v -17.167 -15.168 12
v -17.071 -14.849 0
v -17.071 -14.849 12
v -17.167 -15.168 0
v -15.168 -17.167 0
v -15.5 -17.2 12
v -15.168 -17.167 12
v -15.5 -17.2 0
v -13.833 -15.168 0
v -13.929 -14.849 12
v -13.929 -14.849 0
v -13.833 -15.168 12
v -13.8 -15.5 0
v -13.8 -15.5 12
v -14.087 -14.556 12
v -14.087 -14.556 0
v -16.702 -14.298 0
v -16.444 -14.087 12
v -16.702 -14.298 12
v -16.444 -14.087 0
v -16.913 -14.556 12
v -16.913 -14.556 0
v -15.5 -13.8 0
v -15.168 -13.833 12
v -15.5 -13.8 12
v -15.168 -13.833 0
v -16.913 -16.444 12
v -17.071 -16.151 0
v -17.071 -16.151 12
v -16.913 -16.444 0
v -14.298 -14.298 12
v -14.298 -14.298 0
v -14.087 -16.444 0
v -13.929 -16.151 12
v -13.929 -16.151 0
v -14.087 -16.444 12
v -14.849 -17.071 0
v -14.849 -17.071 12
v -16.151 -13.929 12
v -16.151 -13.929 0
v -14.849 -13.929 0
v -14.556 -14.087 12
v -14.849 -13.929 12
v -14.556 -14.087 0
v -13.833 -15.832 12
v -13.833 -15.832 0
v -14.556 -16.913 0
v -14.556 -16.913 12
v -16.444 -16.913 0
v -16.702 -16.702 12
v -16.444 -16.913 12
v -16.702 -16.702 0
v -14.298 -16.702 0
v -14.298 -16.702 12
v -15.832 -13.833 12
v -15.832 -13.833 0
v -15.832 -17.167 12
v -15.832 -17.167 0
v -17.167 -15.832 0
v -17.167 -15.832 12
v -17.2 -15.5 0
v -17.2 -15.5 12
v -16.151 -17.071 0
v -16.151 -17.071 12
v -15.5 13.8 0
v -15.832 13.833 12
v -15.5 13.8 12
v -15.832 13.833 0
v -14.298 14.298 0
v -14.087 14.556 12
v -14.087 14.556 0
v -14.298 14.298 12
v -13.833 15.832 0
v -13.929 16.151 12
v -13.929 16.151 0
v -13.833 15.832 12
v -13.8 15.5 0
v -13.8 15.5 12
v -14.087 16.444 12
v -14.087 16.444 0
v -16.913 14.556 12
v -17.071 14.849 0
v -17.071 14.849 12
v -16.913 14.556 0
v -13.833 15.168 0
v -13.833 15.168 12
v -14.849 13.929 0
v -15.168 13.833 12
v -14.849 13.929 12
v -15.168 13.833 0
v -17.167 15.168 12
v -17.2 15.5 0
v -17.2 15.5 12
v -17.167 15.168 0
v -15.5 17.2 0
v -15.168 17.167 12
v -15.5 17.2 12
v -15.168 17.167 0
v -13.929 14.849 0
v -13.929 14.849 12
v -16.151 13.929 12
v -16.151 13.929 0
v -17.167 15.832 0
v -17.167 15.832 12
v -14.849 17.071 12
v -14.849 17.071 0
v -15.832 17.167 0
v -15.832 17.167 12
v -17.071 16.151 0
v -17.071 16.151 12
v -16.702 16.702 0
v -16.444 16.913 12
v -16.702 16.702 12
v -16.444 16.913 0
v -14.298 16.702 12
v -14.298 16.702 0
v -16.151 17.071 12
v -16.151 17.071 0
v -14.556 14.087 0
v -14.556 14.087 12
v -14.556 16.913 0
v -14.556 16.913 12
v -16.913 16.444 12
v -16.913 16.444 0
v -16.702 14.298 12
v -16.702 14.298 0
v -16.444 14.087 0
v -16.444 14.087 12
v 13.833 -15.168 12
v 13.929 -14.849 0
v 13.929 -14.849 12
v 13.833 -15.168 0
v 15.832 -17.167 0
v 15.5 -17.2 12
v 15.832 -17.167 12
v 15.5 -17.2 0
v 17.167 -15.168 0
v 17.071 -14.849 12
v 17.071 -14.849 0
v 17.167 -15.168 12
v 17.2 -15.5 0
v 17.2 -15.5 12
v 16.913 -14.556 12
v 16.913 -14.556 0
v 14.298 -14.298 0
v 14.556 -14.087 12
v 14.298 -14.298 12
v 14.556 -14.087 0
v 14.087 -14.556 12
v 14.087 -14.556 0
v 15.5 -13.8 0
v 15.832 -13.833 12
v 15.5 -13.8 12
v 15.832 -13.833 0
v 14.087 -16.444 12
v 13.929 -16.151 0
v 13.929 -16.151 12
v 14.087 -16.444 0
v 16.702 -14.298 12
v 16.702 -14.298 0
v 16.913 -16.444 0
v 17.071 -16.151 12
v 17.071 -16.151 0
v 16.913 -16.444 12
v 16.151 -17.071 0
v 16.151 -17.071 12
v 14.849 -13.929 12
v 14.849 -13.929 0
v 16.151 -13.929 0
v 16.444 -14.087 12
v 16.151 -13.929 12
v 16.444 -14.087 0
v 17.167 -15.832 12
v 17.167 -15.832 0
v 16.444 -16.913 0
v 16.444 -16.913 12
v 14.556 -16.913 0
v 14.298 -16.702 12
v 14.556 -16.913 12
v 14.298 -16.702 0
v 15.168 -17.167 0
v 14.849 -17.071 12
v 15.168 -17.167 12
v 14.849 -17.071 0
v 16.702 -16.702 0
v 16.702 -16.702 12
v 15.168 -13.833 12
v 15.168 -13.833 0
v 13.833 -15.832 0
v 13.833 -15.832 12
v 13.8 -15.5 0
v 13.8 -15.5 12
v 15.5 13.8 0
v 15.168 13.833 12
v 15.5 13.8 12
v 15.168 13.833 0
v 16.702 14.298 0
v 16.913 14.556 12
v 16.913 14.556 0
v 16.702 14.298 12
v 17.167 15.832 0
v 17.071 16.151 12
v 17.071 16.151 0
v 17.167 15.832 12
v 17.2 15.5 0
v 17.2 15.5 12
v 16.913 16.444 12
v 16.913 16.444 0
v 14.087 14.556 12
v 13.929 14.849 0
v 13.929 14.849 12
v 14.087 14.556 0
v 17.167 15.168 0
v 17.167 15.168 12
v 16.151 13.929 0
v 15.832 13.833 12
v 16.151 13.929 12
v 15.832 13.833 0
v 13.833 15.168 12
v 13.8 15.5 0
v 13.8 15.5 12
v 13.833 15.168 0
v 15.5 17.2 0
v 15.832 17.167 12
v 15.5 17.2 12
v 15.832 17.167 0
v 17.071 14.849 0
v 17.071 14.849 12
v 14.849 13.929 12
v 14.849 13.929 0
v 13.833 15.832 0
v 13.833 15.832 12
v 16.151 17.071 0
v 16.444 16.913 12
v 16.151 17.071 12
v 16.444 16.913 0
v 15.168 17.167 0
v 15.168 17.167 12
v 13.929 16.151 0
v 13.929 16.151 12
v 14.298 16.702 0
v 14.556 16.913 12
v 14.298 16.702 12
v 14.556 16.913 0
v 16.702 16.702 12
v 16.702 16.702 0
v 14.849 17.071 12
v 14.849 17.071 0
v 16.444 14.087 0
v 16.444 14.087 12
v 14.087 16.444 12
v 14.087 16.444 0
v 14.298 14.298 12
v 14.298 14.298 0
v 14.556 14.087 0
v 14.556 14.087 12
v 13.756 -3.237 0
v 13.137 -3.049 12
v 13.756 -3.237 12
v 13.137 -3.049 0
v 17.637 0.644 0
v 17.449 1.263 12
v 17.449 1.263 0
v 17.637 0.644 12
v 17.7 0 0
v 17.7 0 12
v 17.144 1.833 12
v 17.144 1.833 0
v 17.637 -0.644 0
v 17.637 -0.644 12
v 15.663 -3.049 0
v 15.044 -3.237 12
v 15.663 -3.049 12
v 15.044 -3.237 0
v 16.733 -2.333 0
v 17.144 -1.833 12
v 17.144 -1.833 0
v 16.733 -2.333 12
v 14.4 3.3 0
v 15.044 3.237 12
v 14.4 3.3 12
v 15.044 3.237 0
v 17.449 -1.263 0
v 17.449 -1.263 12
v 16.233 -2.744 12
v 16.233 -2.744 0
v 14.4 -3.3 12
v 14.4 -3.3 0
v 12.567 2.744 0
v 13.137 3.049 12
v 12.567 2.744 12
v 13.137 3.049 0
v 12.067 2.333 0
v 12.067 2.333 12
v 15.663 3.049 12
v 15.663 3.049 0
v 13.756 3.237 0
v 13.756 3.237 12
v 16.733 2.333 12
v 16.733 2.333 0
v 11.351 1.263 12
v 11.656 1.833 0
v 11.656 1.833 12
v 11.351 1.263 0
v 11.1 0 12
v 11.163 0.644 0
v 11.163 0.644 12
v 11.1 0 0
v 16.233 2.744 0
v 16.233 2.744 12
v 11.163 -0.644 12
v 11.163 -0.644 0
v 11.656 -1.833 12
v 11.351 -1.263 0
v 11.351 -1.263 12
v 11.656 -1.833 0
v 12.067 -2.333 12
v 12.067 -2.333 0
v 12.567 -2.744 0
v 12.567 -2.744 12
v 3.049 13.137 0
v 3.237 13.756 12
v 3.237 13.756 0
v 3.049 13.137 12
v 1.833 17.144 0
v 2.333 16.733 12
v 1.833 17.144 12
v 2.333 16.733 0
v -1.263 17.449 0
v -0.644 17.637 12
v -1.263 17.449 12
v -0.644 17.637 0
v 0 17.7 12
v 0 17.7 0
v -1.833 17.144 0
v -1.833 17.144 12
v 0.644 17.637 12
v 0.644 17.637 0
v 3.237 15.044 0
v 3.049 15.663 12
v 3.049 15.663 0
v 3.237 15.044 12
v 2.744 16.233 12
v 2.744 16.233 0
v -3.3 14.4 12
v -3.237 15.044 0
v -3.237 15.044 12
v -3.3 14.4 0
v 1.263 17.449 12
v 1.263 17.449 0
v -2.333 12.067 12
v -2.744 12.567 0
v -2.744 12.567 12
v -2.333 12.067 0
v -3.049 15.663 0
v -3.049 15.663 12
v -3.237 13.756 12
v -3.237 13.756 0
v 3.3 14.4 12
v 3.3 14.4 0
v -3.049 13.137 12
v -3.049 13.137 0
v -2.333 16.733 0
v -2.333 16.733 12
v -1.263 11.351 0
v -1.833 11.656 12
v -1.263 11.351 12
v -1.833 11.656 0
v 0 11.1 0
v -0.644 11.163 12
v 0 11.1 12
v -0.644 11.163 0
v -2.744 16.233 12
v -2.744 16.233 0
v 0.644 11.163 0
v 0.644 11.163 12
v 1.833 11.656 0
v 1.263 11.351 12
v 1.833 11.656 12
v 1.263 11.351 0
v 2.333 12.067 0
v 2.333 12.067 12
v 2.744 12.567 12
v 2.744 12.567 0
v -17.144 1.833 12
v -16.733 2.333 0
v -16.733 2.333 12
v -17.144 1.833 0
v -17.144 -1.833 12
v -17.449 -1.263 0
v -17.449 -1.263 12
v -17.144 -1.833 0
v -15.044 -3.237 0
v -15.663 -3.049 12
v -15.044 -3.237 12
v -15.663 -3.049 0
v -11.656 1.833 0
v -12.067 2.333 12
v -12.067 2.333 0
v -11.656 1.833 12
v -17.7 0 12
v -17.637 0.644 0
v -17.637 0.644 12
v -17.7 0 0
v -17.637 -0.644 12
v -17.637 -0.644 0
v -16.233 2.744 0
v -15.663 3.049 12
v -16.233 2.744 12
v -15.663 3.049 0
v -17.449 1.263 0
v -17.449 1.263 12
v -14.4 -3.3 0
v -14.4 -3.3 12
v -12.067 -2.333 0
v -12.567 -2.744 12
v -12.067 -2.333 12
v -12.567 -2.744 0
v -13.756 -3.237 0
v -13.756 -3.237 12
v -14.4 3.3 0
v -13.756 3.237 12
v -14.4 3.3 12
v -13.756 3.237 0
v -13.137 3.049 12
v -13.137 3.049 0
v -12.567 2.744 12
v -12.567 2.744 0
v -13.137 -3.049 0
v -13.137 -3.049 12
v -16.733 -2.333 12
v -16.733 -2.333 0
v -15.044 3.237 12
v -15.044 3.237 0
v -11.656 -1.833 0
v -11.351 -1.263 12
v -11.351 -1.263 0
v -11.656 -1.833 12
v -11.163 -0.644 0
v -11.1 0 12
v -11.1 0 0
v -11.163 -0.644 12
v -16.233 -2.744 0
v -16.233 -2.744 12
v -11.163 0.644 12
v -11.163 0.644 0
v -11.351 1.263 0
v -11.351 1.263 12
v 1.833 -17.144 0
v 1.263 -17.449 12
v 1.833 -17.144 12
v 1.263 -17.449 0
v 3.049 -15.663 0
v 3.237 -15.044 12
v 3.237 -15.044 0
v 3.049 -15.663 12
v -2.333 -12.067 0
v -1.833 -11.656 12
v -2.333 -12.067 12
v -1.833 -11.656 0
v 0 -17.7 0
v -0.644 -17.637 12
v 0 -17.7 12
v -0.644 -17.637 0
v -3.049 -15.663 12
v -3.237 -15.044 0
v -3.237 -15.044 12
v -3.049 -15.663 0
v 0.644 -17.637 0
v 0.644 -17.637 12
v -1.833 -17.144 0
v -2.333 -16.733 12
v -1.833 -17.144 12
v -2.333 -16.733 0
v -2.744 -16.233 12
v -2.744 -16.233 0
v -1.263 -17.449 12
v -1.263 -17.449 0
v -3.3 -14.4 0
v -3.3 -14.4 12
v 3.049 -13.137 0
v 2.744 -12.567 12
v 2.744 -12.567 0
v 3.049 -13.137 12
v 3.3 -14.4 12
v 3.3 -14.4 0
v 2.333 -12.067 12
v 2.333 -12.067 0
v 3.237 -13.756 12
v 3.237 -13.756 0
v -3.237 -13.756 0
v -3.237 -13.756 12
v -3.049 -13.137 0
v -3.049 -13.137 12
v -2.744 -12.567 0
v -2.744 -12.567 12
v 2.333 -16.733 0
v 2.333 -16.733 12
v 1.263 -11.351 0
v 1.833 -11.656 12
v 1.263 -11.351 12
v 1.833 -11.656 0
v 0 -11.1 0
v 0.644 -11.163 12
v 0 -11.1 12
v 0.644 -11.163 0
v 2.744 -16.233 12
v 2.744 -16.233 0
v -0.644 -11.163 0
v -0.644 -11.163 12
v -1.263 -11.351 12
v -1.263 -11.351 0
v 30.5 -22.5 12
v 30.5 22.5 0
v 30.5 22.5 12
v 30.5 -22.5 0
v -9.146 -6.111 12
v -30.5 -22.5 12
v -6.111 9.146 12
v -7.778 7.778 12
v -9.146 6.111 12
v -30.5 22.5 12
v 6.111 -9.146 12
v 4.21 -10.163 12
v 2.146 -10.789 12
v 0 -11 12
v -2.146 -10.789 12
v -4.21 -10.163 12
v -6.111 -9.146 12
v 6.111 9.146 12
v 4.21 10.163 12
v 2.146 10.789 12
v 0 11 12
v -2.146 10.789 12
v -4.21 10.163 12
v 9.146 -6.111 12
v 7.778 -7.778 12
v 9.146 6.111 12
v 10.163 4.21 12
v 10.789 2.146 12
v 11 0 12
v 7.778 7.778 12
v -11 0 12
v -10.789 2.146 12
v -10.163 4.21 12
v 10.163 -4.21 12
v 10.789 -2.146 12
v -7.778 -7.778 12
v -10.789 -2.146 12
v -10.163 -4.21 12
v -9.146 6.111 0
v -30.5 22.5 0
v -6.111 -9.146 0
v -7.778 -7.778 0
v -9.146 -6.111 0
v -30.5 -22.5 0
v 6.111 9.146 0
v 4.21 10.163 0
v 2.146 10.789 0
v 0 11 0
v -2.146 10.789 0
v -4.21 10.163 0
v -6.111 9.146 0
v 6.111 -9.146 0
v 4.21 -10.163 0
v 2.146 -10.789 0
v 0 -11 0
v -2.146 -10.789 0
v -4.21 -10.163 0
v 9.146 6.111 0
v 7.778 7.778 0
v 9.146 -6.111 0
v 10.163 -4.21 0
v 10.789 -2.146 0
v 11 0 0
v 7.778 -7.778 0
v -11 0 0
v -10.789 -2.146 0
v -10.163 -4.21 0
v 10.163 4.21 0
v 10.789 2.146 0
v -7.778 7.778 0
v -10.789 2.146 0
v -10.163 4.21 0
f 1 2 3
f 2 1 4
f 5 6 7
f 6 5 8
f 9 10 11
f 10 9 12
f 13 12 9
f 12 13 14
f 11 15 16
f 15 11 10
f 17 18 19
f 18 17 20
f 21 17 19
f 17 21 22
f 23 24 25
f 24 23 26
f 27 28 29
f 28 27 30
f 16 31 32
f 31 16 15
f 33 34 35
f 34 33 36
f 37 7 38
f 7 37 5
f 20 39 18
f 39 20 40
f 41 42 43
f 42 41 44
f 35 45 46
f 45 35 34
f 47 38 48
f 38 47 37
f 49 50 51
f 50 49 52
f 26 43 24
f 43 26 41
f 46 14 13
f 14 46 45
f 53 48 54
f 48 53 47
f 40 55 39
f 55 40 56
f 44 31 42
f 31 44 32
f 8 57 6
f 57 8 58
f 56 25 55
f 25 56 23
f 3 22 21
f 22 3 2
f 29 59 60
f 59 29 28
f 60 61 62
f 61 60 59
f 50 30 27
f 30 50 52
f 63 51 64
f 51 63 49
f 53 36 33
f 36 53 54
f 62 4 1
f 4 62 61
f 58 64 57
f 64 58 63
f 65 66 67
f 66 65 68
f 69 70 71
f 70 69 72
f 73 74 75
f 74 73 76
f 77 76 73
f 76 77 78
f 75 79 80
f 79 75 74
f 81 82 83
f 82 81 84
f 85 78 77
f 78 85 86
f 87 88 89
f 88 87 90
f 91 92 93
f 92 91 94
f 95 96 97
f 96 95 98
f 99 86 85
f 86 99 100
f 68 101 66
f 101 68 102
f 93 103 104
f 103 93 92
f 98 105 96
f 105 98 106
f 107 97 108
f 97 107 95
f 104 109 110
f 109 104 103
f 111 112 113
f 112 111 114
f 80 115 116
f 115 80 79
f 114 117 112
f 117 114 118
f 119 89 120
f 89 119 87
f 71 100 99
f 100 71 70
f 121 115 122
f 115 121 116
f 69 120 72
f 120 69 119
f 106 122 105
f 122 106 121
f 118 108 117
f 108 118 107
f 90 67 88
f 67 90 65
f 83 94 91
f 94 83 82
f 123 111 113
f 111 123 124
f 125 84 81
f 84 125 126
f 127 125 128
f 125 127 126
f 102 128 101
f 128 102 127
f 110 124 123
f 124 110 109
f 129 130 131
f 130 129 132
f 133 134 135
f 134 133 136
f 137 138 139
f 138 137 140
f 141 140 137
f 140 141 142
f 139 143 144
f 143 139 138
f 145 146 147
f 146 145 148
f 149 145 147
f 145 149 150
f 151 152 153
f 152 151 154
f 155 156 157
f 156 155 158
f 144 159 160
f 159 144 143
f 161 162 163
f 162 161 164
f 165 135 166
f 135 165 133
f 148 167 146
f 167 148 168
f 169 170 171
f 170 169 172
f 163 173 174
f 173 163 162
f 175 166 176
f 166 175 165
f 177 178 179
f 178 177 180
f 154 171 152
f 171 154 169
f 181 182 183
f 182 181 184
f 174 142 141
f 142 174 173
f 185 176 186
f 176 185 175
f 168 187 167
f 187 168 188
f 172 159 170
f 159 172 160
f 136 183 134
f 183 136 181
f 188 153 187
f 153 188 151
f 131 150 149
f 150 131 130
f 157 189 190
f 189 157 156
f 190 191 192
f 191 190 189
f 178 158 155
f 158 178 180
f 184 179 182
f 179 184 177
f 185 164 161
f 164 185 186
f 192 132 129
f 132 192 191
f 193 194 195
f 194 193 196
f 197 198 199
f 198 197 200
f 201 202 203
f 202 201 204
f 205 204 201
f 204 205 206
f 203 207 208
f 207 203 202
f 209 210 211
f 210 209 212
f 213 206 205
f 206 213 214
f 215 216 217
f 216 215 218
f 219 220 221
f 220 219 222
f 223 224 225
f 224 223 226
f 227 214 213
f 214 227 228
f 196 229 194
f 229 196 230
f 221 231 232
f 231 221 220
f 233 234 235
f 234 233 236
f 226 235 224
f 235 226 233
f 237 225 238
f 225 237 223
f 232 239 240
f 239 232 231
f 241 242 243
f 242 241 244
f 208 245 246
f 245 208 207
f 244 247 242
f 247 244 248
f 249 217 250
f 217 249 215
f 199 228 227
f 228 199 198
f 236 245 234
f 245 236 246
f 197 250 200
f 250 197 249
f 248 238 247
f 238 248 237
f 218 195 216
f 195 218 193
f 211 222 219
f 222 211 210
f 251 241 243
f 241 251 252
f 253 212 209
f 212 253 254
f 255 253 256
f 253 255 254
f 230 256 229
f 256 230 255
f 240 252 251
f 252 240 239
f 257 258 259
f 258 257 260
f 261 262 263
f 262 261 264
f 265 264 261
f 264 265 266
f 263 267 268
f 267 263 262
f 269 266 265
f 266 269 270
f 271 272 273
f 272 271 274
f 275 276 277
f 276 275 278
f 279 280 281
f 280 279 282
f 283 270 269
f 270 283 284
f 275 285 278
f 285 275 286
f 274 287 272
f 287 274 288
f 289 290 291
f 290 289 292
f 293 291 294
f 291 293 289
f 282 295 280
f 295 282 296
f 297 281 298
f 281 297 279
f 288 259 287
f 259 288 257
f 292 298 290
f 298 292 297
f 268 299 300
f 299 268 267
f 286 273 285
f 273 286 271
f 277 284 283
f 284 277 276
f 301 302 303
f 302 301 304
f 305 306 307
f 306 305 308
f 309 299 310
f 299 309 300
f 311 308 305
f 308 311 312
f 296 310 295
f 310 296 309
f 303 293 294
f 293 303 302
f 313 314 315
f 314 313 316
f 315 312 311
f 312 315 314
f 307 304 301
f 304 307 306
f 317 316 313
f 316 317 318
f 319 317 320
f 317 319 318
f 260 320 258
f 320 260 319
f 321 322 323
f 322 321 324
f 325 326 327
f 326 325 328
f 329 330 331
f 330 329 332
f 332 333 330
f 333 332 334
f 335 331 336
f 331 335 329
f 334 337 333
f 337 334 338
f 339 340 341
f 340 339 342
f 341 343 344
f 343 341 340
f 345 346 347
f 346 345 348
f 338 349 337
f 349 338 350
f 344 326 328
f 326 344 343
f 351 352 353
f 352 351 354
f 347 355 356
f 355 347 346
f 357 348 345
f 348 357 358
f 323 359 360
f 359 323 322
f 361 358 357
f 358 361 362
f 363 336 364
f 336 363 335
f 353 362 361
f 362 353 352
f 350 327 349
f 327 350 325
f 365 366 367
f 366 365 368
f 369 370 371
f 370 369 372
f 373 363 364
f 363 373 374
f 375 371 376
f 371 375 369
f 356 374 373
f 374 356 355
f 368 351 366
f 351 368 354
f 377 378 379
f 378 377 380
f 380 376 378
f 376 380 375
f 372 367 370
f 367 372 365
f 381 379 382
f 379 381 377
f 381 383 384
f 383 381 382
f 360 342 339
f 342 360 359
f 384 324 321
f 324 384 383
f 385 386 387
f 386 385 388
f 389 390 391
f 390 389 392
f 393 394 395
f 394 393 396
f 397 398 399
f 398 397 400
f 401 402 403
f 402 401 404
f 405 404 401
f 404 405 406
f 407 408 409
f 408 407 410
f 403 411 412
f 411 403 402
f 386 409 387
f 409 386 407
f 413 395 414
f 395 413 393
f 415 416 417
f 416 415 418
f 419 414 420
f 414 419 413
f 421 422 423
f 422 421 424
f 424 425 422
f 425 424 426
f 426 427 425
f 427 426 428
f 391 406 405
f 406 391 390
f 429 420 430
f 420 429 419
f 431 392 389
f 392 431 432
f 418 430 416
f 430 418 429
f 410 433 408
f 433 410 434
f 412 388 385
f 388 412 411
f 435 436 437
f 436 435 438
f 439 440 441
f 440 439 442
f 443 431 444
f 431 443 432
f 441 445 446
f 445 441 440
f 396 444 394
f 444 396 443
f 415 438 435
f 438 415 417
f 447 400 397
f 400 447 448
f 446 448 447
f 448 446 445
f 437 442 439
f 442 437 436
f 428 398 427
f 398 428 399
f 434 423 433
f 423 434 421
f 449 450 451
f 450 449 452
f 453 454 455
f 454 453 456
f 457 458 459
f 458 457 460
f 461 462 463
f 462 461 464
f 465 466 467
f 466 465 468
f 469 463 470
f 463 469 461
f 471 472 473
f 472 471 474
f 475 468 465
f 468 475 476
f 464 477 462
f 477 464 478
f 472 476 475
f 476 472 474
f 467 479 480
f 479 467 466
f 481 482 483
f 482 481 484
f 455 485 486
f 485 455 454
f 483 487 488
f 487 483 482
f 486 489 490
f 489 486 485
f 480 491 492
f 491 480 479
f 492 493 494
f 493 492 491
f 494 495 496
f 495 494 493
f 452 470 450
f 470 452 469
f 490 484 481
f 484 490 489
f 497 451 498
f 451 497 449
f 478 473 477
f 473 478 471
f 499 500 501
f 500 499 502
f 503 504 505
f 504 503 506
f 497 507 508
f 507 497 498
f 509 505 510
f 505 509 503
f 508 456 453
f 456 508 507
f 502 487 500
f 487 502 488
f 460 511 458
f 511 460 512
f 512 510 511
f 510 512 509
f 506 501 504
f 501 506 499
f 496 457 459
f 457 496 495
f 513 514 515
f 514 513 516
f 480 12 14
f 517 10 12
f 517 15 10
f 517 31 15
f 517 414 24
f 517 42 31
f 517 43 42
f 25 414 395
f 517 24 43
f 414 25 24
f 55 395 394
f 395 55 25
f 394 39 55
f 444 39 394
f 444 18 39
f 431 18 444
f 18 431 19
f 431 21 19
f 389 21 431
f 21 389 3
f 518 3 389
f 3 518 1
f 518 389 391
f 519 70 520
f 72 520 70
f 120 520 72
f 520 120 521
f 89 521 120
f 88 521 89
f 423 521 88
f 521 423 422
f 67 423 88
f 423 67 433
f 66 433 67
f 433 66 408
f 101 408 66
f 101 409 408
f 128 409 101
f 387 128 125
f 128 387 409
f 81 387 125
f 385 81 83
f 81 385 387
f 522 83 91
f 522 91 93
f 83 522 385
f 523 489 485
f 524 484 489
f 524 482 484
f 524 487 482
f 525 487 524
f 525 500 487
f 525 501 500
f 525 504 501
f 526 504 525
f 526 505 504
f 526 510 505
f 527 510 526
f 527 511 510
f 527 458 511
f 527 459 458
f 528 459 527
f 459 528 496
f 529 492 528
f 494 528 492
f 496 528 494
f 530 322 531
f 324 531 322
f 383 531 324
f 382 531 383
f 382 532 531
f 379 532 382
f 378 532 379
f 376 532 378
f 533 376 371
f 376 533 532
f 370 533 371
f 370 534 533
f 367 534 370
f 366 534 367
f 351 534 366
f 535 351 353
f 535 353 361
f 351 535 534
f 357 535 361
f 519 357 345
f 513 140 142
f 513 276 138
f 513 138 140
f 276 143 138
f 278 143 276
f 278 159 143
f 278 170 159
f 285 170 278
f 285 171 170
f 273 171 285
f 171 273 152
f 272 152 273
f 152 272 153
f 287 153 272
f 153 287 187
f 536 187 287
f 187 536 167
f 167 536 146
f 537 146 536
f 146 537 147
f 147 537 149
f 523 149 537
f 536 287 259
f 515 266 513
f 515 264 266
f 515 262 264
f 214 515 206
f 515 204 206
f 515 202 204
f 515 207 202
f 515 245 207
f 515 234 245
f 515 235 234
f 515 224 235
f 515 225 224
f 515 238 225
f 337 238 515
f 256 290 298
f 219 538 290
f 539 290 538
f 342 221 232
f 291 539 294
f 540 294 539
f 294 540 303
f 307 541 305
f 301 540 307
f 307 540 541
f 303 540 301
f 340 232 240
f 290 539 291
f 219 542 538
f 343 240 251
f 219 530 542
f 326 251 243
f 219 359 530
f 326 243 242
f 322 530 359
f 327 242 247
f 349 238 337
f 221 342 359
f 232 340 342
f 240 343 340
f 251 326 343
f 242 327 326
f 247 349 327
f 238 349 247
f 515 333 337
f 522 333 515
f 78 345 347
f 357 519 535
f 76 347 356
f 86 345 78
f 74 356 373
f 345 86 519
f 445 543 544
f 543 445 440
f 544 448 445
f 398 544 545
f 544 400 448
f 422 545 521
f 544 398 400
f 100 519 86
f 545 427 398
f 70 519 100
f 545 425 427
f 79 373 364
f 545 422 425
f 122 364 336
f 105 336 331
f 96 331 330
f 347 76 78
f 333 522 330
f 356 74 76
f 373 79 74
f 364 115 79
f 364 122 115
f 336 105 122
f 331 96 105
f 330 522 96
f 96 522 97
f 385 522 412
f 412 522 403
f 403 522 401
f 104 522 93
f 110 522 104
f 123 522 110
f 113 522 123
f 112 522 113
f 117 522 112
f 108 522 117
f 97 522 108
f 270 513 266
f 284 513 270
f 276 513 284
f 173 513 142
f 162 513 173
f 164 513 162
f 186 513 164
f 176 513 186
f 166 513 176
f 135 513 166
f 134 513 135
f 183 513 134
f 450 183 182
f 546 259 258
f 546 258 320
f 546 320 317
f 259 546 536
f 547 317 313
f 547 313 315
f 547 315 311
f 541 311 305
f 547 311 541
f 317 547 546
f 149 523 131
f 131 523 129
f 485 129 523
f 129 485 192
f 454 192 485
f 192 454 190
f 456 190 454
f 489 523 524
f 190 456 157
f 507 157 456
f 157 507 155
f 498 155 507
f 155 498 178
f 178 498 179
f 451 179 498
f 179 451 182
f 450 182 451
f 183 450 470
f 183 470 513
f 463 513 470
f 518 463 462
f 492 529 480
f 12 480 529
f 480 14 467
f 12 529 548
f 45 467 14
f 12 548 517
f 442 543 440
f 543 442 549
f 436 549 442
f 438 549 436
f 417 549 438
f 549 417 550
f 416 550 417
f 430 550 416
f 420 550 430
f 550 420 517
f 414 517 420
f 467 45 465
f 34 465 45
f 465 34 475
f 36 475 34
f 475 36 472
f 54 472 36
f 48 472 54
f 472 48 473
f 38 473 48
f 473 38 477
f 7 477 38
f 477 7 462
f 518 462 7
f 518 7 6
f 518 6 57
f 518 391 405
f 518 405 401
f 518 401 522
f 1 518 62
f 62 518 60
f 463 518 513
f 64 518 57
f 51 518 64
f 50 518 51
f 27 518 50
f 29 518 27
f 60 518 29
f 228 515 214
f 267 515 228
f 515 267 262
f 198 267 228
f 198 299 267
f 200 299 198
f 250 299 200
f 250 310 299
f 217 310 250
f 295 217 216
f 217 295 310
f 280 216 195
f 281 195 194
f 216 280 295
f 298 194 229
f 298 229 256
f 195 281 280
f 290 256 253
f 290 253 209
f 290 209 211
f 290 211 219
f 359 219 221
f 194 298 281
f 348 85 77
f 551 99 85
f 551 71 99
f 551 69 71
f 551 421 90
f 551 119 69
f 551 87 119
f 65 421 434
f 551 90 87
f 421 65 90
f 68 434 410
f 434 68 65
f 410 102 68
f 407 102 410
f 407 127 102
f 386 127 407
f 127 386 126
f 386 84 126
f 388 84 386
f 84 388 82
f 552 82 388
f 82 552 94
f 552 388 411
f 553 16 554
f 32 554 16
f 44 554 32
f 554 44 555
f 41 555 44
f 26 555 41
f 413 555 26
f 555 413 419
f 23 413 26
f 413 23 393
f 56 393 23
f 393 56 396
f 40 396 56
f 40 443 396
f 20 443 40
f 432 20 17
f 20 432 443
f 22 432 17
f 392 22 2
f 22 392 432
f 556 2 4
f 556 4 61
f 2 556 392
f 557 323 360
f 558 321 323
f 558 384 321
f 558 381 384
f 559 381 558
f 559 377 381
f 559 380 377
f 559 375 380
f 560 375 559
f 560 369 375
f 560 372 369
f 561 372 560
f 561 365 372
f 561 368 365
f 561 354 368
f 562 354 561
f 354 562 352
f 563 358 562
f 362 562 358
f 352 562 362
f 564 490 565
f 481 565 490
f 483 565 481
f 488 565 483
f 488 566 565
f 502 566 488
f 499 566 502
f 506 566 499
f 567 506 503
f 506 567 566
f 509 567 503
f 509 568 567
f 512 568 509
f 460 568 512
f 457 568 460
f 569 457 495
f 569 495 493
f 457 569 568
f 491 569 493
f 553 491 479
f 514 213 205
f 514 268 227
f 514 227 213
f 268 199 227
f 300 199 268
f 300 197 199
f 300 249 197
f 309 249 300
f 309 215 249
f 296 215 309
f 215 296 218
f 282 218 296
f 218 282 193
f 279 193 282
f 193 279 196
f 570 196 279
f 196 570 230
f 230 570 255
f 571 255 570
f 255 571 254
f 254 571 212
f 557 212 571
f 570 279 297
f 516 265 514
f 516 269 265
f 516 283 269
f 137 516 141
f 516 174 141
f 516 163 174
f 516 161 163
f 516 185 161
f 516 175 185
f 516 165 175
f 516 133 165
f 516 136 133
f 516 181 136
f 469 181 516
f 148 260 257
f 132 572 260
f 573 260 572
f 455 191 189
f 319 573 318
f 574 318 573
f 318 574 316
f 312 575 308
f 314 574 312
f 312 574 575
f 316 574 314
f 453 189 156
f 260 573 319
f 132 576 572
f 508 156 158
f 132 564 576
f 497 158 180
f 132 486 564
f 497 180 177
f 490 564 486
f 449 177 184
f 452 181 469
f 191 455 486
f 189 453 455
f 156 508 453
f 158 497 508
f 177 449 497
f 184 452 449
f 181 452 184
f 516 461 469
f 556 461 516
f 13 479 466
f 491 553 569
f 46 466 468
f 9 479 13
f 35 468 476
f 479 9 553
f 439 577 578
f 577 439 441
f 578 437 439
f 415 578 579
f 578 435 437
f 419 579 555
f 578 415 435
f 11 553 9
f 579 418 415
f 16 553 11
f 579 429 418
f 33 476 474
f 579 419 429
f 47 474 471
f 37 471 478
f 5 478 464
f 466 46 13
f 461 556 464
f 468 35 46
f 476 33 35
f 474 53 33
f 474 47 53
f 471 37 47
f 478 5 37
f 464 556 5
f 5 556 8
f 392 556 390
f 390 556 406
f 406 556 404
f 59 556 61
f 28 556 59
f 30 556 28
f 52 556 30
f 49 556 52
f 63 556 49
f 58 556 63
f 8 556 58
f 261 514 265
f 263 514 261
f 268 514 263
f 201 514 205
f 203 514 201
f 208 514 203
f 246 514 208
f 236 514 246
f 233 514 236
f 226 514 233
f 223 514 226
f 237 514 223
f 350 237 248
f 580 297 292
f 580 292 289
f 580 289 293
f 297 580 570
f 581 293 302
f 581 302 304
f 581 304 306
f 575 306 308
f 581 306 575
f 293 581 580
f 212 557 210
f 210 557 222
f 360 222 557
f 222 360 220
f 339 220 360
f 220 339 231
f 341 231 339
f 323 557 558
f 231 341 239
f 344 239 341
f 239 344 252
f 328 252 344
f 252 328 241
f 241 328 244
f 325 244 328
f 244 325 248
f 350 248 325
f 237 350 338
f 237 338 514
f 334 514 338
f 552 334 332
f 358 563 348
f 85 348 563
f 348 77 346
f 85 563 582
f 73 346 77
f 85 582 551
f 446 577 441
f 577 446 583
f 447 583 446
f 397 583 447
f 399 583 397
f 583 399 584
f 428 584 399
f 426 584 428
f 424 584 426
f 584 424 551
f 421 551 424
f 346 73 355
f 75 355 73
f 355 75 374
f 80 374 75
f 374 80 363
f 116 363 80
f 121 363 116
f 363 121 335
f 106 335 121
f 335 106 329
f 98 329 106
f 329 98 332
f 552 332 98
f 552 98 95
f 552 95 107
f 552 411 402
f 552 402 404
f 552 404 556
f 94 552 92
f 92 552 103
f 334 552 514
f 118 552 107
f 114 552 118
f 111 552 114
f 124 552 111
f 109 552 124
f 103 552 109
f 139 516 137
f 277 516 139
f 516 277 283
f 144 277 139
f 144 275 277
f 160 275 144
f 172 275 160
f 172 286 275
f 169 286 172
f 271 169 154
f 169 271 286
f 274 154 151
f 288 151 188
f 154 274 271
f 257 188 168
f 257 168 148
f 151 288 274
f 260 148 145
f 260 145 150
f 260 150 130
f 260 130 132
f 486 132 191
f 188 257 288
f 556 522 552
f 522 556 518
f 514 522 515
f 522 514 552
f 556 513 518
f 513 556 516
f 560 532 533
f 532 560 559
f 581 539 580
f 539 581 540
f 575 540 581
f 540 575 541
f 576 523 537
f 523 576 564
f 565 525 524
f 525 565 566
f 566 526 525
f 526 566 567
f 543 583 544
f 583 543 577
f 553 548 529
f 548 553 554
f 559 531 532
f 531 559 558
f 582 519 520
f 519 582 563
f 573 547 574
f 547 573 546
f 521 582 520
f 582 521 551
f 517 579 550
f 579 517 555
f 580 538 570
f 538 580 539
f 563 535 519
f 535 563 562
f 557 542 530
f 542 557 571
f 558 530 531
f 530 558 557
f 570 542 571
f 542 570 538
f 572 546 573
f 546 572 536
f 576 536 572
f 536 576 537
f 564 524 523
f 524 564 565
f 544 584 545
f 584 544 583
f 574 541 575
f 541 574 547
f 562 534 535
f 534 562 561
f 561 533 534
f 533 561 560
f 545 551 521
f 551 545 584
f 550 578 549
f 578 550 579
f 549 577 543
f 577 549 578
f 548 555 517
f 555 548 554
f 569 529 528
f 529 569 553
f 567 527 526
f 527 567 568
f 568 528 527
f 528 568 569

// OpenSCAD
$fn = 32;

// ----------------------------------------------------------------------
// Motor mount plate: NEMA17, 61 x 45 x 12 mm
// ----------------------------------------------------------------------

// --- parameters (mm) ---
base_x = 61;              // plate length, X
base_y = 45;              // plate width, Y
thick = 12;               // plate thickness
bolt_pitch = 31;          // NEMA17 bolt spacing
motor_d = 3.4;            // NEMA17 screw clearance
boss_hole = 22;           // pilot boss bore
second_d = 6.6;           // second fastener hole
bc_r = 14.4;              // second bolt circle radius
bc_n = 4;                 // second bolt circle count

module plate() {
  translate([-base_x / 2, -base_y / 2, 0]) cube([base_x, base_y, thick]);
}

module motor_holes() {
  for (sx = [-1, 1]) for (sy = [-1, 1])
    translate([sx * bolt_pitch / 2, sy * bolt_pitch / 2, -1])
      cylinder(h = thick + 2, d = motor_d);
}

difference() {
  union() {
    plate();
  }
  motor_holes();
  translate([0, 0, -1]) cylinder(h = thick + 2, d = boss_hole);
  for (i = [0 : bc_n - 1]) rotate([0, 0, i * 360 / bc_n]) translate([bc_r, 0, -1])    cylinder(h = thick + 2, d = second_d);
}
